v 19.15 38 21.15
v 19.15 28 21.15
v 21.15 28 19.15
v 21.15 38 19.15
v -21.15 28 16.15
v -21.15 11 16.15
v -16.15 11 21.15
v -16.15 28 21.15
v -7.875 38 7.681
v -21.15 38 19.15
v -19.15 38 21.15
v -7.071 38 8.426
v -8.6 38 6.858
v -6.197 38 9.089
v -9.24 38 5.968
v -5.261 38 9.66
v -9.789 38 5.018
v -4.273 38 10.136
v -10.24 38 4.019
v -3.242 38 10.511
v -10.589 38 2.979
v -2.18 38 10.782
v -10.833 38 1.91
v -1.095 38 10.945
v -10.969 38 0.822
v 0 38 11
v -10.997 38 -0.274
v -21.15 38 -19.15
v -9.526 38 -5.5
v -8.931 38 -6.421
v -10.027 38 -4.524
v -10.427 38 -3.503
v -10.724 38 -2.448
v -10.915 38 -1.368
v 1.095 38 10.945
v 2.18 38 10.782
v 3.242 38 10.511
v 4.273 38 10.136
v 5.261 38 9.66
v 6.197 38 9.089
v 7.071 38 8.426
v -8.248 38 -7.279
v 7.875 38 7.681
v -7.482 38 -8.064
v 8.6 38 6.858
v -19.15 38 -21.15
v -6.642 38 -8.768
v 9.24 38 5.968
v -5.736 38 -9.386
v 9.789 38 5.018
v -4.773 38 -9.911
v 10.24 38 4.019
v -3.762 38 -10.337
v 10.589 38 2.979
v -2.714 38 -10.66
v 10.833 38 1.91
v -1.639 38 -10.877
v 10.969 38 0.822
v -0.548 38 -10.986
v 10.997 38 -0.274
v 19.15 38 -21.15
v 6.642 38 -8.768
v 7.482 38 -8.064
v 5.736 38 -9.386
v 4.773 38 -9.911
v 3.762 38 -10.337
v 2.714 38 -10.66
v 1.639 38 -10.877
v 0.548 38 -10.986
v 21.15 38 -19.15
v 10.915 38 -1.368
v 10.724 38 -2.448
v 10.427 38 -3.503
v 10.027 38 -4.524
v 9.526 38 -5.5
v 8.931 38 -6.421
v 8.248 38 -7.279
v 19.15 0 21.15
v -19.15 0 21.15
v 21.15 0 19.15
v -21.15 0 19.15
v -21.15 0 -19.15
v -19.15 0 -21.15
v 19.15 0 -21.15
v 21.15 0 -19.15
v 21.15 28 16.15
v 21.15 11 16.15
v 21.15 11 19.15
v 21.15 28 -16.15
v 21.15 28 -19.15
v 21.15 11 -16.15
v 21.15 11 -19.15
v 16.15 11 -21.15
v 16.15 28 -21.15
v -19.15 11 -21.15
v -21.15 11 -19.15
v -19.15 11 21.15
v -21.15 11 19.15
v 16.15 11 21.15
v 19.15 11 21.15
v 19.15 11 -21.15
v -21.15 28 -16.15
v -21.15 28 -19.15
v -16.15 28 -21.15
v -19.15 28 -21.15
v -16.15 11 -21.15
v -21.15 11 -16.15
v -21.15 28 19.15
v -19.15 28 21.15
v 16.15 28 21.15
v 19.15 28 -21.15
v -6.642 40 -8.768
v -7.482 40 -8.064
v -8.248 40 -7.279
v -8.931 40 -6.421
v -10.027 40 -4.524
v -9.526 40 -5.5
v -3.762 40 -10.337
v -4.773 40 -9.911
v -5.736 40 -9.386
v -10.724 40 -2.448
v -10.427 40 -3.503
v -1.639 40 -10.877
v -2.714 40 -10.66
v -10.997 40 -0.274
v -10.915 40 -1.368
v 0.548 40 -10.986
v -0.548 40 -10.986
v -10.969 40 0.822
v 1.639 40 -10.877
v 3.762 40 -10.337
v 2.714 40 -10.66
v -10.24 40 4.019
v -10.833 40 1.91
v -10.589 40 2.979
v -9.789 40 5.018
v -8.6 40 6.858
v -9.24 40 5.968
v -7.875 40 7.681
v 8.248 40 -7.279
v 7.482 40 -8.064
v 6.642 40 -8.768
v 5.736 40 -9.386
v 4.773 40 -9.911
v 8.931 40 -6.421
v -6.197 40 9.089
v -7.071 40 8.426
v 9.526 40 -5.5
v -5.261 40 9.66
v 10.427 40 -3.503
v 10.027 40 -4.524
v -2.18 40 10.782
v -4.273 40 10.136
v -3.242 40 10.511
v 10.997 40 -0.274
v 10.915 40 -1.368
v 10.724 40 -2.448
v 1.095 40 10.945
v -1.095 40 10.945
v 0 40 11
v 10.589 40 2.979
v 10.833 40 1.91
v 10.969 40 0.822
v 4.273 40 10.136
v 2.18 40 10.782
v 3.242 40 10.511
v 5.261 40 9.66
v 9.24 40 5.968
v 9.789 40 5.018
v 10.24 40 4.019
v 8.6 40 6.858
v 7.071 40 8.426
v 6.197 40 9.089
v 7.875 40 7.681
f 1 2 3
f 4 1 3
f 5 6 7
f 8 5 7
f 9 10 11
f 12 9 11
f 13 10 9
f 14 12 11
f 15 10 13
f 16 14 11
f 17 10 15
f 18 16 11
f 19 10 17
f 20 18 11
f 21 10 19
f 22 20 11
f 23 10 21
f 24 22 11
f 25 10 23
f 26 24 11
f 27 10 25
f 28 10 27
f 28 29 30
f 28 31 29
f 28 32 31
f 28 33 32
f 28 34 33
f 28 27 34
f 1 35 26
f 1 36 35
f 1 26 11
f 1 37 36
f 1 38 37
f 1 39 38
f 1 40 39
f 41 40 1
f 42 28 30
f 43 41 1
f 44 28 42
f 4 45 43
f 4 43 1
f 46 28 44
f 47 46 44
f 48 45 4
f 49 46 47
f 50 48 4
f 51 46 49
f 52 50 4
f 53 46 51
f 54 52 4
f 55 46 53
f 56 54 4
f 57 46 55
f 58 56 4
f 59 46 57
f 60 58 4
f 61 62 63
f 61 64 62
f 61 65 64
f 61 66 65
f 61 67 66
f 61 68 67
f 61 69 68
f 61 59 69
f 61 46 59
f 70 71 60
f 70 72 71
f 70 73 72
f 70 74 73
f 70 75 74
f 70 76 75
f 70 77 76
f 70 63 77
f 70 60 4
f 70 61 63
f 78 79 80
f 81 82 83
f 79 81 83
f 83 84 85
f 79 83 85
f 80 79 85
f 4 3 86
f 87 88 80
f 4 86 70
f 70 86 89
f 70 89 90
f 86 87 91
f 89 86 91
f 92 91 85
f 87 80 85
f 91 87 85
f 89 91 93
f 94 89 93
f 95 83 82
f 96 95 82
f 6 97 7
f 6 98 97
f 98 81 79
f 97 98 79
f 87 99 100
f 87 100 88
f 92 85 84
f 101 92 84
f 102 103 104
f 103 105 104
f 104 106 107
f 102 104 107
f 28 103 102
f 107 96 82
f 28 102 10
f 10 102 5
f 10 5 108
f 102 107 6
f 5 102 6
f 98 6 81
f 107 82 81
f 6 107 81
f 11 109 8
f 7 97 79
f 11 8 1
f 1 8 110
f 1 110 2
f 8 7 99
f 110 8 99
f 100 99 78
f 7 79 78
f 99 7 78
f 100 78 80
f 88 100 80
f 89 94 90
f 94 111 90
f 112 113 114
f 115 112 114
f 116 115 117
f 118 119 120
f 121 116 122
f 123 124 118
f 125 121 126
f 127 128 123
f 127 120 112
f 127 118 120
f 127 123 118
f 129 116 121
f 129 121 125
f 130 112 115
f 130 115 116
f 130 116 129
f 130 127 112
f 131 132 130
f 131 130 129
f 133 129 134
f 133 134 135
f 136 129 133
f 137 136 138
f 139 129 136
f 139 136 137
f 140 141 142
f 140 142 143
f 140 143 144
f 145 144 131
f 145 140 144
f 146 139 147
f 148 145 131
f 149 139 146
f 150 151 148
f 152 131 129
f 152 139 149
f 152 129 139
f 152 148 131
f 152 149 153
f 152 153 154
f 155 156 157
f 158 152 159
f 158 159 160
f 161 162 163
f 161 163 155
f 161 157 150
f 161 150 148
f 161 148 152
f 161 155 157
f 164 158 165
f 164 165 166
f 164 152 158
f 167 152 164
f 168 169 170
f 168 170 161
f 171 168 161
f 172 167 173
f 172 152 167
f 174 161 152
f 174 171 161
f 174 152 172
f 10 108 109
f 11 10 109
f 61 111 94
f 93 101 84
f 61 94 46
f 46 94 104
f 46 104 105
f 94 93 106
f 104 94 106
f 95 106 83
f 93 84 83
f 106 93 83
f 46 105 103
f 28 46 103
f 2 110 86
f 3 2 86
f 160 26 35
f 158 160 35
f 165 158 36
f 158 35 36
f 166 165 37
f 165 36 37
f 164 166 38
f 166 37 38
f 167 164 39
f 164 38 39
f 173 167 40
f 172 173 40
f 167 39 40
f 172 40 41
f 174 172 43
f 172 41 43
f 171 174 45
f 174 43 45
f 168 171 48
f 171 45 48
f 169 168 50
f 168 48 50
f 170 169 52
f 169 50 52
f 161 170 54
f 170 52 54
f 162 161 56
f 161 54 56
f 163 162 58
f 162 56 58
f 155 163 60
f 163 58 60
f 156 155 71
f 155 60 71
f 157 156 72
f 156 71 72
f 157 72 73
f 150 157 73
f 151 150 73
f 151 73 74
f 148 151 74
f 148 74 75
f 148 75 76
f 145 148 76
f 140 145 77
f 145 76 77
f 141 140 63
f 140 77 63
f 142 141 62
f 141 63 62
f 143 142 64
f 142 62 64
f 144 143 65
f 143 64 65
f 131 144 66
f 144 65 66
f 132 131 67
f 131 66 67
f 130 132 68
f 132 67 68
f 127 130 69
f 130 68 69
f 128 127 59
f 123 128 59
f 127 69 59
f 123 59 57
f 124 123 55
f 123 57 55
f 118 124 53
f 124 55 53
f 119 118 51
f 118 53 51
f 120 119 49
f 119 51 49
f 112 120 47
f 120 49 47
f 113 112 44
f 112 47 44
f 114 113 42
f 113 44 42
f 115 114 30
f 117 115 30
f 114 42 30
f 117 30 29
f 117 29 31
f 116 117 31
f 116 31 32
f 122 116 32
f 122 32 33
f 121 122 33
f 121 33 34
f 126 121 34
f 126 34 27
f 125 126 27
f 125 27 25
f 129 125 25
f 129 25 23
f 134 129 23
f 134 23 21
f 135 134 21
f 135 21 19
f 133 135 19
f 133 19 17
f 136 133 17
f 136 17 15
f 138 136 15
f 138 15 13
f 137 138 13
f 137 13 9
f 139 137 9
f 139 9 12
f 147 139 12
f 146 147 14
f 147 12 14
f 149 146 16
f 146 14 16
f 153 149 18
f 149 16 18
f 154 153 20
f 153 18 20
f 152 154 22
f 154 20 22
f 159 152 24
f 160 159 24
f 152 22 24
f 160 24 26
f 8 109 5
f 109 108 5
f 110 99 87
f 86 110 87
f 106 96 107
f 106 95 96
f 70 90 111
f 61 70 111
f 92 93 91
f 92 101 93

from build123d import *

# Parameters (mm, degrees)
BOSS_EXTRUDE1_DEPTH = 11
BOSS_EXTRUDE2_DEPTH = 17
BOSS_EXTRUDE3_DEPTH = 10
SKETCH4_R           = 11
BOSS_EXTRUDE4_DEPTH = 2


with BuildPart() as part:
    # Sketch1 → Boss-Extrude1 (new body)
    with BuildSketch(Plane(origin=(0, 0, 0), x_dir=(1, 0, 0), z_dir=(0, 1, 0))):
        Polygon((19.15, -21.15), (21.15, -19.15), (21.15, 19.15), (19.15, 21.15), (-19.15, 21.15), (-21.15, 19.15), (-21.15, -19.15), (-19.15, -21.15), align=None)
    extrude(amount=BOSS_EXTRUDE1_DEPTH)

    # Sketch2 → Boss-Extrude2 (add)
    with BuildSketch(Plane(origin=(0, 11, 0), x_dir=(1, 0, 0), z_dir=(0, 1, 0))):
        Polygon((16.15, -21.15), (21.15, -16.15), (21.15, 16.15), (16.15, 21.15), (-16.15, 21.15), (-21.15, 16.15), (-21.15, -16.15), (-16.15, -21.15), align=None)
    extrude(amount=BOSS_EXTRUDE2_DEPTH)

    # Sketch3 → Boss-Extrude3 (add)
    with BuildSketch(Plane(origin=(0, 28, 0), x_dir=(1, 0, 0), z_dir=(0, 1, 0))):
        Polygon((19.15, -21.15), (21.15, -19.15), (21.15, 19.15), (19.15, 21.15), (-19.15, 21.15), (-21.15, 19.15), (-21.15, -19.15), (-19.15, -21.15), align=None)
    extrude(amount=BOSS_EXTRUDE3_DEPTH)

    # Sketch4 → Boss-Extrude4 (add)
    with BuildSketch(Plane(origin=(0, 38, 0), x_dir=(1, 0, 0), z_dir=(0, 1, 0))):
        with Locations(Location((0, 0, 0), (0, 0, 270))):
            Circle(SKETCH4_R)
    extrude(amount=BOSS_EXTRUDE4_DEPTH)


solid = part.part
